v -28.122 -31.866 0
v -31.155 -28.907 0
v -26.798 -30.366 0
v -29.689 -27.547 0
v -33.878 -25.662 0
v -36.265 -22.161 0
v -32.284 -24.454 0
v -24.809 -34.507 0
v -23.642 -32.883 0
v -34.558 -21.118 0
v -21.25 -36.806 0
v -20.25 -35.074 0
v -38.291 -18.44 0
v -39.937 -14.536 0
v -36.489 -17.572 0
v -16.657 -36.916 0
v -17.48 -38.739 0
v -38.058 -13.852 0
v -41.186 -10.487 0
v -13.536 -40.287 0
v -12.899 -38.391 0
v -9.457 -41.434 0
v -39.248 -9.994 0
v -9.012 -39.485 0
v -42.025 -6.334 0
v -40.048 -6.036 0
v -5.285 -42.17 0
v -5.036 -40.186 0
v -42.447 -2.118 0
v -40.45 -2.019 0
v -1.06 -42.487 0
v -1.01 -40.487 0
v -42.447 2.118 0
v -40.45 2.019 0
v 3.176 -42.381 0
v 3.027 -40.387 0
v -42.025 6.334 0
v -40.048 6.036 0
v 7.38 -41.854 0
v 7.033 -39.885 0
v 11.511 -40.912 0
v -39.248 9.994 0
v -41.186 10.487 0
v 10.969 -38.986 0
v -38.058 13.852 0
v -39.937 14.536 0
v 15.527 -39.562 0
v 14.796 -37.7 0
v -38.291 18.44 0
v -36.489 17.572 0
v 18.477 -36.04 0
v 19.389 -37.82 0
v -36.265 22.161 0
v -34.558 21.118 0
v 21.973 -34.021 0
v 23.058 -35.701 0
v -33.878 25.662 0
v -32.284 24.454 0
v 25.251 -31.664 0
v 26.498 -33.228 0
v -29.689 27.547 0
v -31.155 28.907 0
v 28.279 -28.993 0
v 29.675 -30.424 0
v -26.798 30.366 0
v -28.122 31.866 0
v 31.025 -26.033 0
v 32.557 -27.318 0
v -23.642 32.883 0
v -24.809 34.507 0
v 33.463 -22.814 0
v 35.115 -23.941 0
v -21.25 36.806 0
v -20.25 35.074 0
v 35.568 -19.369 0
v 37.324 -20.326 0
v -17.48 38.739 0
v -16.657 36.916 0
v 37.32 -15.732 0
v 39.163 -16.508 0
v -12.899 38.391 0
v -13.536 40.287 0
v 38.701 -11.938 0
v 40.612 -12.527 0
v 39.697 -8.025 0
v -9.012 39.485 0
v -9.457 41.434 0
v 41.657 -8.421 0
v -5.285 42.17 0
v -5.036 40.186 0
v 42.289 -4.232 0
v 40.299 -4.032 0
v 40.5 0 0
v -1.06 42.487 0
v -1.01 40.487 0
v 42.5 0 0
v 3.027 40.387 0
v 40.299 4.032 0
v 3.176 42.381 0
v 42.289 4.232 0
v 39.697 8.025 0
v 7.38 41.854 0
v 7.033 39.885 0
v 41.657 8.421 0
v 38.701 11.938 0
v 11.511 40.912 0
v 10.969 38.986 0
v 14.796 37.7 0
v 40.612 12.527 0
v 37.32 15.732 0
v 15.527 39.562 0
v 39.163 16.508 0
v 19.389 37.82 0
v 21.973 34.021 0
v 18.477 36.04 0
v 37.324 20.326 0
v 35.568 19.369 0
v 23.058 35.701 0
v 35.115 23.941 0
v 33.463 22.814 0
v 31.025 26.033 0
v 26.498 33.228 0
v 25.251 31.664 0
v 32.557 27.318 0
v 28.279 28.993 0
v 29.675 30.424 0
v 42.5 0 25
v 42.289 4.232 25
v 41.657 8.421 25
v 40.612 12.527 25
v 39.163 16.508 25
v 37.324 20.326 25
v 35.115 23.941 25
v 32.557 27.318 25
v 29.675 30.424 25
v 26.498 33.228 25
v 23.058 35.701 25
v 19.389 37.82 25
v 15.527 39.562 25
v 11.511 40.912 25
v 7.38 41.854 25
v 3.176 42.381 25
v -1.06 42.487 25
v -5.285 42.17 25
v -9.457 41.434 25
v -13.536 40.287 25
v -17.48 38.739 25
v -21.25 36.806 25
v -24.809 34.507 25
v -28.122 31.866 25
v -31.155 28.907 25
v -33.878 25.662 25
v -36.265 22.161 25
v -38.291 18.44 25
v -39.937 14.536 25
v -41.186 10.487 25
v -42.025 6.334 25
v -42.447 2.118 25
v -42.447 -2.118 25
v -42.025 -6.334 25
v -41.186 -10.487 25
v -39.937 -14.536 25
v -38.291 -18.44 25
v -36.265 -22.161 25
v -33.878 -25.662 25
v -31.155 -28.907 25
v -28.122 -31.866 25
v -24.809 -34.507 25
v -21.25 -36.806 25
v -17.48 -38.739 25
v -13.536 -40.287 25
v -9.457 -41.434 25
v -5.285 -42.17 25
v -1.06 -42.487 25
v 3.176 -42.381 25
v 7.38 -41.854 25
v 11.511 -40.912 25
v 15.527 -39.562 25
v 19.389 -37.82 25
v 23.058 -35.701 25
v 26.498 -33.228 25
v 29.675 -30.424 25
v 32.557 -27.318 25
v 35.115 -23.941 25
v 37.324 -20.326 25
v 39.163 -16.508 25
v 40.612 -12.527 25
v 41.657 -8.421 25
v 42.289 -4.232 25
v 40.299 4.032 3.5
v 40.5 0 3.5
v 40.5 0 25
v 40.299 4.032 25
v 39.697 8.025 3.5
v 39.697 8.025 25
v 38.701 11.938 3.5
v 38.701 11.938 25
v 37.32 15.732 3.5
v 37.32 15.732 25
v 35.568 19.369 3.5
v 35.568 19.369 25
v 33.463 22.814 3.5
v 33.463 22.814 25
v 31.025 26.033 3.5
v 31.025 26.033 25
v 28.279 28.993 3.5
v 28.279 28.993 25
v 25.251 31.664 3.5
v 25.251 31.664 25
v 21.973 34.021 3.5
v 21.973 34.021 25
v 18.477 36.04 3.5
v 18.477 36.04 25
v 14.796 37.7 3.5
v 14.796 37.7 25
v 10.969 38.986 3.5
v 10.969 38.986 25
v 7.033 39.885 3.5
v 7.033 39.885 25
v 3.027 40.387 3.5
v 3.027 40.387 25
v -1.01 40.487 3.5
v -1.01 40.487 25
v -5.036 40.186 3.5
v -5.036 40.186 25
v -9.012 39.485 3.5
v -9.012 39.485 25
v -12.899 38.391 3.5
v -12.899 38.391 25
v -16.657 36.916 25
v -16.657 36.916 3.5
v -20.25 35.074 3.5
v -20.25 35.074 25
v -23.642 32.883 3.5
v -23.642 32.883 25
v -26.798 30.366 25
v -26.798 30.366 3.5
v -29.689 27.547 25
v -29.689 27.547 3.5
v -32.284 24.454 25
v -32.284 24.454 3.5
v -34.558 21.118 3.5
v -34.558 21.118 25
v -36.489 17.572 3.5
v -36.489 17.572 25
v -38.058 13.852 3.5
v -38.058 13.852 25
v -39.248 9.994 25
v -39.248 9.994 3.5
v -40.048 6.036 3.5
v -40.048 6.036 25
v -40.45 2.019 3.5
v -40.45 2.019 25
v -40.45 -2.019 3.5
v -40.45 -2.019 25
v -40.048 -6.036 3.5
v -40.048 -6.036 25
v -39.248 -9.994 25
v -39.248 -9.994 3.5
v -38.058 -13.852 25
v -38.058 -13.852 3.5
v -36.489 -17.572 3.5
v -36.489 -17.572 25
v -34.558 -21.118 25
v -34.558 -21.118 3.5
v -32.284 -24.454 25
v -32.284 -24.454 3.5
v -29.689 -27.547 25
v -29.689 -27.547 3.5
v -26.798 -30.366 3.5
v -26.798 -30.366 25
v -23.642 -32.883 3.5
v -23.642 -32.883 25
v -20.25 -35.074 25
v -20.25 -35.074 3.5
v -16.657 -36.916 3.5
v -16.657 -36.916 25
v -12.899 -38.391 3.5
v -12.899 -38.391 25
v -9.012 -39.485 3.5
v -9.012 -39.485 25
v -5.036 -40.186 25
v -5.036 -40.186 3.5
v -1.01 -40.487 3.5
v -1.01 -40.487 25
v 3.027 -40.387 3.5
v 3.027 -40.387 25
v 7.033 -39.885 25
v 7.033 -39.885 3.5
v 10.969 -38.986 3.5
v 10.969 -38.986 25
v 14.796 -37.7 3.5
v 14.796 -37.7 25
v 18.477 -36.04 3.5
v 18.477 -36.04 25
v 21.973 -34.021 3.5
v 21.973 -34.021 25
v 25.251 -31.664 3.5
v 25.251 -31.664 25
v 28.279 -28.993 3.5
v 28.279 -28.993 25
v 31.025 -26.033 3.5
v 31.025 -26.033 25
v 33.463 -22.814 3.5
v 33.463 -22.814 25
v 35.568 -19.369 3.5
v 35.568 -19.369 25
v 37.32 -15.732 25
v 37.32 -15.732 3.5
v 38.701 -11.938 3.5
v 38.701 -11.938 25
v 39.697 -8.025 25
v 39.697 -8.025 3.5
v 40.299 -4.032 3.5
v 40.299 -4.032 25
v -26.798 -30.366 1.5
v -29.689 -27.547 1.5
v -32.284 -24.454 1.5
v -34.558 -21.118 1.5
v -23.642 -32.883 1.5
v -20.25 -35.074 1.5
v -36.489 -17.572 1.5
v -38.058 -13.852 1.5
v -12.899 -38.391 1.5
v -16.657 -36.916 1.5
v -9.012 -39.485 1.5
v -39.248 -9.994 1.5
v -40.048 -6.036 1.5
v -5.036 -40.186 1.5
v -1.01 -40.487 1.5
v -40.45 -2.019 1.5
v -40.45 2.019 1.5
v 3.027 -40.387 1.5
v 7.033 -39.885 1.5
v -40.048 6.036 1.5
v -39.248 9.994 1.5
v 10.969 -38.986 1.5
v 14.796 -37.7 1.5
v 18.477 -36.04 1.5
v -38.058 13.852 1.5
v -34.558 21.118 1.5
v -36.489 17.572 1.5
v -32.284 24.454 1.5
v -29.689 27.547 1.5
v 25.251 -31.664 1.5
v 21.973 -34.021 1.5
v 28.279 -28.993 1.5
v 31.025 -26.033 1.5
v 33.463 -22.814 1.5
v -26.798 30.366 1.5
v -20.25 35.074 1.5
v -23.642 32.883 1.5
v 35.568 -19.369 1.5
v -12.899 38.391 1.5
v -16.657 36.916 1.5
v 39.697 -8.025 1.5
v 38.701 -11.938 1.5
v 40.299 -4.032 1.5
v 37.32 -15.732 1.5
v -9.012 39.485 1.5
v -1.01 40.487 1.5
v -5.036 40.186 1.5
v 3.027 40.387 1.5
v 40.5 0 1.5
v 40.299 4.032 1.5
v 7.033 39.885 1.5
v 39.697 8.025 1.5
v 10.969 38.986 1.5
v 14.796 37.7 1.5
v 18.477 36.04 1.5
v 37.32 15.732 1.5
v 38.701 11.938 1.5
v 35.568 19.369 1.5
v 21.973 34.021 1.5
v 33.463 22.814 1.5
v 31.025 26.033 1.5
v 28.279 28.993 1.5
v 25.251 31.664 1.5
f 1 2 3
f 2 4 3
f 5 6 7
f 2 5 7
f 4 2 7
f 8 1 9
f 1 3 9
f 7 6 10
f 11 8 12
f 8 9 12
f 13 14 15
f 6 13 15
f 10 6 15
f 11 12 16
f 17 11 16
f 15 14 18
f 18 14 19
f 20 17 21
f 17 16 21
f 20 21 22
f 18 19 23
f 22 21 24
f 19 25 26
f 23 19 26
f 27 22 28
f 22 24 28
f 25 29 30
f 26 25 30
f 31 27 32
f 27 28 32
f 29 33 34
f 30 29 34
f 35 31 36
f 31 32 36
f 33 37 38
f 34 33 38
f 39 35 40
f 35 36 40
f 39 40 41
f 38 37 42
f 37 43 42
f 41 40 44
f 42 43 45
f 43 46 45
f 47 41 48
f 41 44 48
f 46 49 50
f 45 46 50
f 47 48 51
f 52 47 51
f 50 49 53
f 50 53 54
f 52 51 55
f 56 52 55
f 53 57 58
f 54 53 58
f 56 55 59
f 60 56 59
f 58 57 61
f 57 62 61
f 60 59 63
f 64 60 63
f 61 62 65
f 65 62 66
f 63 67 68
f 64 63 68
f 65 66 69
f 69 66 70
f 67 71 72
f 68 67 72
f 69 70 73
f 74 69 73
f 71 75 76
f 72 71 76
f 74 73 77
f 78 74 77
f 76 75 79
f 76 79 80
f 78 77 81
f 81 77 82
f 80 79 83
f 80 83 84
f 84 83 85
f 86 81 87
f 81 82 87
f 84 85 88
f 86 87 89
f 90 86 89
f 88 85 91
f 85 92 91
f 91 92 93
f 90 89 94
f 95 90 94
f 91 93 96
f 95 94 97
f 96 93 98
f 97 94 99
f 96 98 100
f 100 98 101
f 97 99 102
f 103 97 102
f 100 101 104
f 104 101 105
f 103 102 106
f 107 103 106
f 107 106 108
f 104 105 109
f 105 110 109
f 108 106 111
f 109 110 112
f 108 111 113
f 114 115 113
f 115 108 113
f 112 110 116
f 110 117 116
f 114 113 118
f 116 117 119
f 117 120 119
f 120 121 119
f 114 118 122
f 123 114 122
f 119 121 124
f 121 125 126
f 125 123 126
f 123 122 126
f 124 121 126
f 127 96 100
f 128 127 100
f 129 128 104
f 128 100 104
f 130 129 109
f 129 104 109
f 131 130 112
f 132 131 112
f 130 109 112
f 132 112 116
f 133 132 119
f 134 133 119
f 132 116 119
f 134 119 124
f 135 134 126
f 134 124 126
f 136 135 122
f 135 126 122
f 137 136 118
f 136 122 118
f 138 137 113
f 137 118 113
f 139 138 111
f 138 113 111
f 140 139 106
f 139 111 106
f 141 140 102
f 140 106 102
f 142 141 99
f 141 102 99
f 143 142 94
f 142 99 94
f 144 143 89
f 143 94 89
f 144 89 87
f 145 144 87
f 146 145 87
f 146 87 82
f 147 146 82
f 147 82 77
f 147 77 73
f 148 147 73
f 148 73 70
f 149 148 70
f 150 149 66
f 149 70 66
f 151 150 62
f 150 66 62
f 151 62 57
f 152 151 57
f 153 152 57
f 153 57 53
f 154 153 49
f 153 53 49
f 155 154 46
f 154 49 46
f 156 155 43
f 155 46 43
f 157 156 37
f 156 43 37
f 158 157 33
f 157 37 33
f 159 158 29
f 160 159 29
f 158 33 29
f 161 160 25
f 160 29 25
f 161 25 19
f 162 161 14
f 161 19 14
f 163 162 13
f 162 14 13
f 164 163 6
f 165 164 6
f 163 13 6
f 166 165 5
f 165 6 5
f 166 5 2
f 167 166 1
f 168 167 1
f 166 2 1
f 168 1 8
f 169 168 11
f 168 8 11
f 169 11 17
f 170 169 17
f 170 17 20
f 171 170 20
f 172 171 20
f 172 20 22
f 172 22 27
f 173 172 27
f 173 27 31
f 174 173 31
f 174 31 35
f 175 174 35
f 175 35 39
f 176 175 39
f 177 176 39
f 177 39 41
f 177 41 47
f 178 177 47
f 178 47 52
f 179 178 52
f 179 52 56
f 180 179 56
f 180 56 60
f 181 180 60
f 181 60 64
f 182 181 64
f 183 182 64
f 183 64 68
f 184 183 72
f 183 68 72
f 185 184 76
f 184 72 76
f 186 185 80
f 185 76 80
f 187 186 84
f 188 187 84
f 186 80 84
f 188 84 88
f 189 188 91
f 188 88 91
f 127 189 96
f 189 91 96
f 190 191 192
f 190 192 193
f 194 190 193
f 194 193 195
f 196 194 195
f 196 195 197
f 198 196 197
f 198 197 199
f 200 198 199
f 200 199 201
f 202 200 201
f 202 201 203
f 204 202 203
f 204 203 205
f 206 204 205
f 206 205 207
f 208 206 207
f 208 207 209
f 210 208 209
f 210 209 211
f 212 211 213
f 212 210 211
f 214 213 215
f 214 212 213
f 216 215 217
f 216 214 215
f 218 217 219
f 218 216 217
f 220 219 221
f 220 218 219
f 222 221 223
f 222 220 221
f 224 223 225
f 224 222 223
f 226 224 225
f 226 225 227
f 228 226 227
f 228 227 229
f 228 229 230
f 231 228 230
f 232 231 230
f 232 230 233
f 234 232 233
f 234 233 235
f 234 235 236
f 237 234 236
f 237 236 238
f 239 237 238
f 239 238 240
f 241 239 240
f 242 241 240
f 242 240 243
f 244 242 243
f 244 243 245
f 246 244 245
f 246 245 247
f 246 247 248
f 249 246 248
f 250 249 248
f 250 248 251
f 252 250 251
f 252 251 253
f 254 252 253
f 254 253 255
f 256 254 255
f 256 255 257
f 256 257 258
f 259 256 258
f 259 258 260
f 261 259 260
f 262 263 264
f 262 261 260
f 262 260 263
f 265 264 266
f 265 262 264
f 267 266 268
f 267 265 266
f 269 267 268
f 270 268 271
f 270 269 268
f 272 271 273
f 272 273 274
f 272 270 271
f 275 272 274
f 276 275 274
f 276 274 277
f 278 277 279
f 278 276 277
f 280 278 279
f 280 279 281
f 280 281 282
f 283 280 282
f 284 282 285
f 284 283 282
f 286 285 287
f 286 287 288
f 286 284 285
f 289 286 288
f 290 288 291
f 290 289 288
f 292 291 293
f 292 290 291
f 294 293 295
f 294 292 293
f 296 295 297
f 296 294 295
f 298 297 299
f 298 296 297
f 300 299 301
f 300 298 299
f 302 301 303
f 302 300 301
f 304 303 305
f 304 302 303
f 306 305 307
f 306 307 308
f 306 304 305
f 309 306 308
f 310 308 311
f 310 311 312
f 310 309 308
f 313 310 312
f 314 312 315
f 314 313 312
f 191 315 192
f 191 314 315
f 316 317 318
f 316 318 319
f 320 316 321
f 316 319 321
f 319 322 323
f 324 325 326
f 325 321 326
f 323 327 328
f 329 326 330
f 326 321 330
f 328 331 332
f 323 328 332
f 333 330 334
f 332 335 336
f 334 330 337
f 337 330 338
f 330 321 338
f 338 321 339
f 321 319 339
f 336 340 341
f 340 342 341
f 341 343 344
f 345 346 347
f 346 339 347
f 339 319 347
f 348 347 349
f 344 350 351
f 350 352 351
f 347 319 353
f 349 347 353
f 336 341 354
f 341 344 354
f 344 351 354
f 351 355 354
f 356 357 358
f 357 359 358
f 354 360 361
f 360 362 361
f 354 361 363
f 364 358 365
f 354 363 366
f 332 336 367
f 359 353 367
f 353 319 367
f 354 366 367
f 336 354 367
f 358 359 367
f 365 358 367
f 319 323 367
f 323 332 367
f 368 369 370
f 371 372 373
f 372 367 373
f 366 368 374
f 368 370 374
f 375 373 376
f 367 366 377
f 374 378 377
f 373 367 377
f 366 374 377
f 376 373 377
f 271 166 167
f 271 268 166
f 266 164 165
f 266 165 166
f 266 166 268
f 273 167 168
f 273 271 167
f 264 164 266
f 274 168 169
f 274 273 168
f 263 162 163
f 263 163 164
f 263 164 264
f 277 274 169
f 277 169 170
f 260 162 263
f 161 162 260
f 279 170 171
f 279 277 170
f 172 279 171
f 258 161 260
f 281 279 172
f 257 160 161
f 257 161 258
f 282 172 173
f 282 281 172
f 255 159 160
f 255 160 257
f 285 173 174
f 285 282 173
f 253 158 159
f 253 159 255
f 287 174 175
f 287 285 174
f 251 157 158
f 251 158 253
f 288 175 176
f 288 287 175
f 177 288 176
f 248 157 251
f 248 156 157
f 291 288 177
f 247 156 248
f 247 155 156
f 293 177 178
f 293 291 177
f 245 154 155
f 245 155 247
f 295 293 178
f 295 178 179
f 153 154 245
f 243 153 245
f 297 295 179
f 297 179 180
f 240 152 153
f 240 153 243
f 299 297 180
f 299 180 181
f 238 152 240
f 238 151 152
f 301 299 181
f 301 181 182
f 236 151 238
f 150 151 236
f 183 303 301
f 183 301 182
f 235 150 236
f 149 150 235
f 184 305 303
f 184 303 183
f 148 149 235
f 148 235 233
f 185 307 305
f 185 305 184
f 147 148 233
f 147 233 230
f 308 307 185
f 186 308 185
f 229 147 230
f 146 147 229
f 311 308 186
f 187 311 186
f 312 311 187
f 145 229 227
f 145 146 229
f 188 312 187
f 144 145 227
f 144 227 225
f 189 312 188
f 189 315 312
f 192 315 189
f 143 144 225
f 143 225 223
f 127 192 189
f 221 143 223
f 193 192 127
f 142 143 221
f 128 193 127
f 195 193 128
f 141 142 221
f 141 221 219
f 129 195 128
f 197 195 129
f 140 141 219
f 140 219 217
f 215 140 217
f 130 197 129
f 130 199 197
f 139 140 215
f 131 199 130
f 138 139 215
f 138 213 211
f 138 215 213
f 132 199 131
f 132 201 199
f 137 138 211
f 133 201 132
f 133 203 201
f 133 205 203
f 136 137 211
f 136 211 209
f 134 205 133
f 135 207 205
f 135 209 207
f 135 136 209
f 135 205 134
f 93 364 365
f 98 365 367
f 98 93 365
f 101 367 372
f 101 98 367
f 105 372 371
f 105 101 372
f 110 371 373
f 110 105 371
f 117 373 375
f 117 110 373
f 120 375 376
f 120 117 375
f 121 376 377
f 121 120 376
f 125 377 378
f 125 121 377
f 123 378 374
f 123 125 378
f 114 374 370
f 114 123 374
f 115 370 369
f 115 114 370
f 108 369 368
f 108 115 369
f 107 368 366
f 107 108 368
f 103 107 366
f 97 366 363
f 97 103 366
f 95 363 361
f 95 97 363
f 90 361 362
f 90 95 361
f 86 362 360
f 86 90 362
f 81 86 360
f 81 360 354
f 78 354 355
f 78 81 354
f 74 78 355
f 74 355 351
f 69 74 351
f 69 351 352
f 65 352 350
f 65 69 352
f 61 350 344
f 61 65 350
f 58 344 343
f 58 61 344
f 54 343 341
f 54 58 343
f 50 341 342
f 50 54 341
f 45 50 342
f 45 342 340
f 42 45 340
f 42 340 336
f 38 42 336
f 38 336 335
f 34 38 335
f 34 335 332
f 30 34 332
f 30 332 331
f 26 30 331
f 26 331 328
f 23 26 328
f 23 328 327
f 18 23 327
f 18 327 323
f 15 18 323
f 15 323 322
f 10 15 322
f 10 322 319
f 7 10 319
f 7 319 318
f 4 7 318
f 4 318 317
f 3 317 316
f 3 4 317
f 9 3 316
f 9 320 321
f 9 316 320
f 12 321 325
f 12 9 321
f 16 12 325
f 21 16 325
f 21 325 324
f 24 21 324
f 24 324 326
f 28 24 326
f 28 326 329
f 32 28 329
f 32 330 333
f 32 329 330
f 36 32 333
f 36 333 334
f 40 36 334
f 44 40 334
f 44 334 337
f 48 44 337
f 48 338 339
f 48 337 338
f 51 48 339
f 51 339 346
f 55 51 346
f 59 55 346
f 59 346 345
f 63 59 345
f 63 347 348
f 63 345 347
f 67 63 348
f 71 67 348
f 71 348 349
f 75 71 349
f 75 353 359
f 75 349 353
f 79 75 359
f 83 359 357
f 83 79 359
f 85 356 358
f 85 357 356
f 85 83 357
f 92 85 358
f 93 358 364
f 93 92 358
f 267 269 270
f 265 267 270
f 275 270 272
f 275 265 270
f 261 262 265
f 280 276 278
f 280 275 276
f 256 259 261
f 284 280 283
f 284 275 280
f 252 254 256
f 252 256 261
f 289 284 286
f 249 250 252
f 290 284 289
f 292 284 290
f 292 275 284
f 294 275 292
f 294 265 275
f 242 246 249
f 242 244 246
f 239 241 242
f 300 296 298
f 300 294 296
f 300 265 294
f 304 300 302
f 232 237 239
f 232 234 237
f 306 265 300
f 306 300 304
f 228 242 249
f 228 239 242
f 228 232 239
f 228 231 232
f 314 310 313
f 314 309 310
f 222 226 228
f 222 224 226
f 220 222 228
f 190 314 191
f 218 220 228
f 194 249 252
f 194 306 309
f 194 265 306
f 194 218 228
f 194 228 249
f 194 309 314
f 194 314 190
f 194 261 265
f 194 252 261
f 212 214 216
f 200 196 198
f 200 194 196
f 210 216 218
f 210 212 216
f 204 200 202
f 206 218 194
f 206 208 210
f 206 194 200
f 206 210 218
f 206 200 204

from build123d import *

# Parameters (mm, degrees)
F0_R     = 42.130231
F1_DEPTH = 2
F3_R     = 42.5
F3_R_2   = 40.5
F4_DEPTH = 25


with BuildPart() as f1:
    # F0 (on Top) → F1 (new body)
    with BuildSketch(Plane.XY):
        Circle(F0_R)
    extrude(amount=F1_DEPTH)


with BuildPart() as f1_1:
    # F2: moved
    add(f1.part.moved(Location((0, 0, 1.5))))

    # F3 (on Top) → F4 (join)
    with BuildSketch(Plane.XY):
        Circle(F3_R)
        Circle(F3_R_2, mode=Mode.SUBTRACT)
    extrude(amount=F4_DEPTH)


solid = f1_1.part
